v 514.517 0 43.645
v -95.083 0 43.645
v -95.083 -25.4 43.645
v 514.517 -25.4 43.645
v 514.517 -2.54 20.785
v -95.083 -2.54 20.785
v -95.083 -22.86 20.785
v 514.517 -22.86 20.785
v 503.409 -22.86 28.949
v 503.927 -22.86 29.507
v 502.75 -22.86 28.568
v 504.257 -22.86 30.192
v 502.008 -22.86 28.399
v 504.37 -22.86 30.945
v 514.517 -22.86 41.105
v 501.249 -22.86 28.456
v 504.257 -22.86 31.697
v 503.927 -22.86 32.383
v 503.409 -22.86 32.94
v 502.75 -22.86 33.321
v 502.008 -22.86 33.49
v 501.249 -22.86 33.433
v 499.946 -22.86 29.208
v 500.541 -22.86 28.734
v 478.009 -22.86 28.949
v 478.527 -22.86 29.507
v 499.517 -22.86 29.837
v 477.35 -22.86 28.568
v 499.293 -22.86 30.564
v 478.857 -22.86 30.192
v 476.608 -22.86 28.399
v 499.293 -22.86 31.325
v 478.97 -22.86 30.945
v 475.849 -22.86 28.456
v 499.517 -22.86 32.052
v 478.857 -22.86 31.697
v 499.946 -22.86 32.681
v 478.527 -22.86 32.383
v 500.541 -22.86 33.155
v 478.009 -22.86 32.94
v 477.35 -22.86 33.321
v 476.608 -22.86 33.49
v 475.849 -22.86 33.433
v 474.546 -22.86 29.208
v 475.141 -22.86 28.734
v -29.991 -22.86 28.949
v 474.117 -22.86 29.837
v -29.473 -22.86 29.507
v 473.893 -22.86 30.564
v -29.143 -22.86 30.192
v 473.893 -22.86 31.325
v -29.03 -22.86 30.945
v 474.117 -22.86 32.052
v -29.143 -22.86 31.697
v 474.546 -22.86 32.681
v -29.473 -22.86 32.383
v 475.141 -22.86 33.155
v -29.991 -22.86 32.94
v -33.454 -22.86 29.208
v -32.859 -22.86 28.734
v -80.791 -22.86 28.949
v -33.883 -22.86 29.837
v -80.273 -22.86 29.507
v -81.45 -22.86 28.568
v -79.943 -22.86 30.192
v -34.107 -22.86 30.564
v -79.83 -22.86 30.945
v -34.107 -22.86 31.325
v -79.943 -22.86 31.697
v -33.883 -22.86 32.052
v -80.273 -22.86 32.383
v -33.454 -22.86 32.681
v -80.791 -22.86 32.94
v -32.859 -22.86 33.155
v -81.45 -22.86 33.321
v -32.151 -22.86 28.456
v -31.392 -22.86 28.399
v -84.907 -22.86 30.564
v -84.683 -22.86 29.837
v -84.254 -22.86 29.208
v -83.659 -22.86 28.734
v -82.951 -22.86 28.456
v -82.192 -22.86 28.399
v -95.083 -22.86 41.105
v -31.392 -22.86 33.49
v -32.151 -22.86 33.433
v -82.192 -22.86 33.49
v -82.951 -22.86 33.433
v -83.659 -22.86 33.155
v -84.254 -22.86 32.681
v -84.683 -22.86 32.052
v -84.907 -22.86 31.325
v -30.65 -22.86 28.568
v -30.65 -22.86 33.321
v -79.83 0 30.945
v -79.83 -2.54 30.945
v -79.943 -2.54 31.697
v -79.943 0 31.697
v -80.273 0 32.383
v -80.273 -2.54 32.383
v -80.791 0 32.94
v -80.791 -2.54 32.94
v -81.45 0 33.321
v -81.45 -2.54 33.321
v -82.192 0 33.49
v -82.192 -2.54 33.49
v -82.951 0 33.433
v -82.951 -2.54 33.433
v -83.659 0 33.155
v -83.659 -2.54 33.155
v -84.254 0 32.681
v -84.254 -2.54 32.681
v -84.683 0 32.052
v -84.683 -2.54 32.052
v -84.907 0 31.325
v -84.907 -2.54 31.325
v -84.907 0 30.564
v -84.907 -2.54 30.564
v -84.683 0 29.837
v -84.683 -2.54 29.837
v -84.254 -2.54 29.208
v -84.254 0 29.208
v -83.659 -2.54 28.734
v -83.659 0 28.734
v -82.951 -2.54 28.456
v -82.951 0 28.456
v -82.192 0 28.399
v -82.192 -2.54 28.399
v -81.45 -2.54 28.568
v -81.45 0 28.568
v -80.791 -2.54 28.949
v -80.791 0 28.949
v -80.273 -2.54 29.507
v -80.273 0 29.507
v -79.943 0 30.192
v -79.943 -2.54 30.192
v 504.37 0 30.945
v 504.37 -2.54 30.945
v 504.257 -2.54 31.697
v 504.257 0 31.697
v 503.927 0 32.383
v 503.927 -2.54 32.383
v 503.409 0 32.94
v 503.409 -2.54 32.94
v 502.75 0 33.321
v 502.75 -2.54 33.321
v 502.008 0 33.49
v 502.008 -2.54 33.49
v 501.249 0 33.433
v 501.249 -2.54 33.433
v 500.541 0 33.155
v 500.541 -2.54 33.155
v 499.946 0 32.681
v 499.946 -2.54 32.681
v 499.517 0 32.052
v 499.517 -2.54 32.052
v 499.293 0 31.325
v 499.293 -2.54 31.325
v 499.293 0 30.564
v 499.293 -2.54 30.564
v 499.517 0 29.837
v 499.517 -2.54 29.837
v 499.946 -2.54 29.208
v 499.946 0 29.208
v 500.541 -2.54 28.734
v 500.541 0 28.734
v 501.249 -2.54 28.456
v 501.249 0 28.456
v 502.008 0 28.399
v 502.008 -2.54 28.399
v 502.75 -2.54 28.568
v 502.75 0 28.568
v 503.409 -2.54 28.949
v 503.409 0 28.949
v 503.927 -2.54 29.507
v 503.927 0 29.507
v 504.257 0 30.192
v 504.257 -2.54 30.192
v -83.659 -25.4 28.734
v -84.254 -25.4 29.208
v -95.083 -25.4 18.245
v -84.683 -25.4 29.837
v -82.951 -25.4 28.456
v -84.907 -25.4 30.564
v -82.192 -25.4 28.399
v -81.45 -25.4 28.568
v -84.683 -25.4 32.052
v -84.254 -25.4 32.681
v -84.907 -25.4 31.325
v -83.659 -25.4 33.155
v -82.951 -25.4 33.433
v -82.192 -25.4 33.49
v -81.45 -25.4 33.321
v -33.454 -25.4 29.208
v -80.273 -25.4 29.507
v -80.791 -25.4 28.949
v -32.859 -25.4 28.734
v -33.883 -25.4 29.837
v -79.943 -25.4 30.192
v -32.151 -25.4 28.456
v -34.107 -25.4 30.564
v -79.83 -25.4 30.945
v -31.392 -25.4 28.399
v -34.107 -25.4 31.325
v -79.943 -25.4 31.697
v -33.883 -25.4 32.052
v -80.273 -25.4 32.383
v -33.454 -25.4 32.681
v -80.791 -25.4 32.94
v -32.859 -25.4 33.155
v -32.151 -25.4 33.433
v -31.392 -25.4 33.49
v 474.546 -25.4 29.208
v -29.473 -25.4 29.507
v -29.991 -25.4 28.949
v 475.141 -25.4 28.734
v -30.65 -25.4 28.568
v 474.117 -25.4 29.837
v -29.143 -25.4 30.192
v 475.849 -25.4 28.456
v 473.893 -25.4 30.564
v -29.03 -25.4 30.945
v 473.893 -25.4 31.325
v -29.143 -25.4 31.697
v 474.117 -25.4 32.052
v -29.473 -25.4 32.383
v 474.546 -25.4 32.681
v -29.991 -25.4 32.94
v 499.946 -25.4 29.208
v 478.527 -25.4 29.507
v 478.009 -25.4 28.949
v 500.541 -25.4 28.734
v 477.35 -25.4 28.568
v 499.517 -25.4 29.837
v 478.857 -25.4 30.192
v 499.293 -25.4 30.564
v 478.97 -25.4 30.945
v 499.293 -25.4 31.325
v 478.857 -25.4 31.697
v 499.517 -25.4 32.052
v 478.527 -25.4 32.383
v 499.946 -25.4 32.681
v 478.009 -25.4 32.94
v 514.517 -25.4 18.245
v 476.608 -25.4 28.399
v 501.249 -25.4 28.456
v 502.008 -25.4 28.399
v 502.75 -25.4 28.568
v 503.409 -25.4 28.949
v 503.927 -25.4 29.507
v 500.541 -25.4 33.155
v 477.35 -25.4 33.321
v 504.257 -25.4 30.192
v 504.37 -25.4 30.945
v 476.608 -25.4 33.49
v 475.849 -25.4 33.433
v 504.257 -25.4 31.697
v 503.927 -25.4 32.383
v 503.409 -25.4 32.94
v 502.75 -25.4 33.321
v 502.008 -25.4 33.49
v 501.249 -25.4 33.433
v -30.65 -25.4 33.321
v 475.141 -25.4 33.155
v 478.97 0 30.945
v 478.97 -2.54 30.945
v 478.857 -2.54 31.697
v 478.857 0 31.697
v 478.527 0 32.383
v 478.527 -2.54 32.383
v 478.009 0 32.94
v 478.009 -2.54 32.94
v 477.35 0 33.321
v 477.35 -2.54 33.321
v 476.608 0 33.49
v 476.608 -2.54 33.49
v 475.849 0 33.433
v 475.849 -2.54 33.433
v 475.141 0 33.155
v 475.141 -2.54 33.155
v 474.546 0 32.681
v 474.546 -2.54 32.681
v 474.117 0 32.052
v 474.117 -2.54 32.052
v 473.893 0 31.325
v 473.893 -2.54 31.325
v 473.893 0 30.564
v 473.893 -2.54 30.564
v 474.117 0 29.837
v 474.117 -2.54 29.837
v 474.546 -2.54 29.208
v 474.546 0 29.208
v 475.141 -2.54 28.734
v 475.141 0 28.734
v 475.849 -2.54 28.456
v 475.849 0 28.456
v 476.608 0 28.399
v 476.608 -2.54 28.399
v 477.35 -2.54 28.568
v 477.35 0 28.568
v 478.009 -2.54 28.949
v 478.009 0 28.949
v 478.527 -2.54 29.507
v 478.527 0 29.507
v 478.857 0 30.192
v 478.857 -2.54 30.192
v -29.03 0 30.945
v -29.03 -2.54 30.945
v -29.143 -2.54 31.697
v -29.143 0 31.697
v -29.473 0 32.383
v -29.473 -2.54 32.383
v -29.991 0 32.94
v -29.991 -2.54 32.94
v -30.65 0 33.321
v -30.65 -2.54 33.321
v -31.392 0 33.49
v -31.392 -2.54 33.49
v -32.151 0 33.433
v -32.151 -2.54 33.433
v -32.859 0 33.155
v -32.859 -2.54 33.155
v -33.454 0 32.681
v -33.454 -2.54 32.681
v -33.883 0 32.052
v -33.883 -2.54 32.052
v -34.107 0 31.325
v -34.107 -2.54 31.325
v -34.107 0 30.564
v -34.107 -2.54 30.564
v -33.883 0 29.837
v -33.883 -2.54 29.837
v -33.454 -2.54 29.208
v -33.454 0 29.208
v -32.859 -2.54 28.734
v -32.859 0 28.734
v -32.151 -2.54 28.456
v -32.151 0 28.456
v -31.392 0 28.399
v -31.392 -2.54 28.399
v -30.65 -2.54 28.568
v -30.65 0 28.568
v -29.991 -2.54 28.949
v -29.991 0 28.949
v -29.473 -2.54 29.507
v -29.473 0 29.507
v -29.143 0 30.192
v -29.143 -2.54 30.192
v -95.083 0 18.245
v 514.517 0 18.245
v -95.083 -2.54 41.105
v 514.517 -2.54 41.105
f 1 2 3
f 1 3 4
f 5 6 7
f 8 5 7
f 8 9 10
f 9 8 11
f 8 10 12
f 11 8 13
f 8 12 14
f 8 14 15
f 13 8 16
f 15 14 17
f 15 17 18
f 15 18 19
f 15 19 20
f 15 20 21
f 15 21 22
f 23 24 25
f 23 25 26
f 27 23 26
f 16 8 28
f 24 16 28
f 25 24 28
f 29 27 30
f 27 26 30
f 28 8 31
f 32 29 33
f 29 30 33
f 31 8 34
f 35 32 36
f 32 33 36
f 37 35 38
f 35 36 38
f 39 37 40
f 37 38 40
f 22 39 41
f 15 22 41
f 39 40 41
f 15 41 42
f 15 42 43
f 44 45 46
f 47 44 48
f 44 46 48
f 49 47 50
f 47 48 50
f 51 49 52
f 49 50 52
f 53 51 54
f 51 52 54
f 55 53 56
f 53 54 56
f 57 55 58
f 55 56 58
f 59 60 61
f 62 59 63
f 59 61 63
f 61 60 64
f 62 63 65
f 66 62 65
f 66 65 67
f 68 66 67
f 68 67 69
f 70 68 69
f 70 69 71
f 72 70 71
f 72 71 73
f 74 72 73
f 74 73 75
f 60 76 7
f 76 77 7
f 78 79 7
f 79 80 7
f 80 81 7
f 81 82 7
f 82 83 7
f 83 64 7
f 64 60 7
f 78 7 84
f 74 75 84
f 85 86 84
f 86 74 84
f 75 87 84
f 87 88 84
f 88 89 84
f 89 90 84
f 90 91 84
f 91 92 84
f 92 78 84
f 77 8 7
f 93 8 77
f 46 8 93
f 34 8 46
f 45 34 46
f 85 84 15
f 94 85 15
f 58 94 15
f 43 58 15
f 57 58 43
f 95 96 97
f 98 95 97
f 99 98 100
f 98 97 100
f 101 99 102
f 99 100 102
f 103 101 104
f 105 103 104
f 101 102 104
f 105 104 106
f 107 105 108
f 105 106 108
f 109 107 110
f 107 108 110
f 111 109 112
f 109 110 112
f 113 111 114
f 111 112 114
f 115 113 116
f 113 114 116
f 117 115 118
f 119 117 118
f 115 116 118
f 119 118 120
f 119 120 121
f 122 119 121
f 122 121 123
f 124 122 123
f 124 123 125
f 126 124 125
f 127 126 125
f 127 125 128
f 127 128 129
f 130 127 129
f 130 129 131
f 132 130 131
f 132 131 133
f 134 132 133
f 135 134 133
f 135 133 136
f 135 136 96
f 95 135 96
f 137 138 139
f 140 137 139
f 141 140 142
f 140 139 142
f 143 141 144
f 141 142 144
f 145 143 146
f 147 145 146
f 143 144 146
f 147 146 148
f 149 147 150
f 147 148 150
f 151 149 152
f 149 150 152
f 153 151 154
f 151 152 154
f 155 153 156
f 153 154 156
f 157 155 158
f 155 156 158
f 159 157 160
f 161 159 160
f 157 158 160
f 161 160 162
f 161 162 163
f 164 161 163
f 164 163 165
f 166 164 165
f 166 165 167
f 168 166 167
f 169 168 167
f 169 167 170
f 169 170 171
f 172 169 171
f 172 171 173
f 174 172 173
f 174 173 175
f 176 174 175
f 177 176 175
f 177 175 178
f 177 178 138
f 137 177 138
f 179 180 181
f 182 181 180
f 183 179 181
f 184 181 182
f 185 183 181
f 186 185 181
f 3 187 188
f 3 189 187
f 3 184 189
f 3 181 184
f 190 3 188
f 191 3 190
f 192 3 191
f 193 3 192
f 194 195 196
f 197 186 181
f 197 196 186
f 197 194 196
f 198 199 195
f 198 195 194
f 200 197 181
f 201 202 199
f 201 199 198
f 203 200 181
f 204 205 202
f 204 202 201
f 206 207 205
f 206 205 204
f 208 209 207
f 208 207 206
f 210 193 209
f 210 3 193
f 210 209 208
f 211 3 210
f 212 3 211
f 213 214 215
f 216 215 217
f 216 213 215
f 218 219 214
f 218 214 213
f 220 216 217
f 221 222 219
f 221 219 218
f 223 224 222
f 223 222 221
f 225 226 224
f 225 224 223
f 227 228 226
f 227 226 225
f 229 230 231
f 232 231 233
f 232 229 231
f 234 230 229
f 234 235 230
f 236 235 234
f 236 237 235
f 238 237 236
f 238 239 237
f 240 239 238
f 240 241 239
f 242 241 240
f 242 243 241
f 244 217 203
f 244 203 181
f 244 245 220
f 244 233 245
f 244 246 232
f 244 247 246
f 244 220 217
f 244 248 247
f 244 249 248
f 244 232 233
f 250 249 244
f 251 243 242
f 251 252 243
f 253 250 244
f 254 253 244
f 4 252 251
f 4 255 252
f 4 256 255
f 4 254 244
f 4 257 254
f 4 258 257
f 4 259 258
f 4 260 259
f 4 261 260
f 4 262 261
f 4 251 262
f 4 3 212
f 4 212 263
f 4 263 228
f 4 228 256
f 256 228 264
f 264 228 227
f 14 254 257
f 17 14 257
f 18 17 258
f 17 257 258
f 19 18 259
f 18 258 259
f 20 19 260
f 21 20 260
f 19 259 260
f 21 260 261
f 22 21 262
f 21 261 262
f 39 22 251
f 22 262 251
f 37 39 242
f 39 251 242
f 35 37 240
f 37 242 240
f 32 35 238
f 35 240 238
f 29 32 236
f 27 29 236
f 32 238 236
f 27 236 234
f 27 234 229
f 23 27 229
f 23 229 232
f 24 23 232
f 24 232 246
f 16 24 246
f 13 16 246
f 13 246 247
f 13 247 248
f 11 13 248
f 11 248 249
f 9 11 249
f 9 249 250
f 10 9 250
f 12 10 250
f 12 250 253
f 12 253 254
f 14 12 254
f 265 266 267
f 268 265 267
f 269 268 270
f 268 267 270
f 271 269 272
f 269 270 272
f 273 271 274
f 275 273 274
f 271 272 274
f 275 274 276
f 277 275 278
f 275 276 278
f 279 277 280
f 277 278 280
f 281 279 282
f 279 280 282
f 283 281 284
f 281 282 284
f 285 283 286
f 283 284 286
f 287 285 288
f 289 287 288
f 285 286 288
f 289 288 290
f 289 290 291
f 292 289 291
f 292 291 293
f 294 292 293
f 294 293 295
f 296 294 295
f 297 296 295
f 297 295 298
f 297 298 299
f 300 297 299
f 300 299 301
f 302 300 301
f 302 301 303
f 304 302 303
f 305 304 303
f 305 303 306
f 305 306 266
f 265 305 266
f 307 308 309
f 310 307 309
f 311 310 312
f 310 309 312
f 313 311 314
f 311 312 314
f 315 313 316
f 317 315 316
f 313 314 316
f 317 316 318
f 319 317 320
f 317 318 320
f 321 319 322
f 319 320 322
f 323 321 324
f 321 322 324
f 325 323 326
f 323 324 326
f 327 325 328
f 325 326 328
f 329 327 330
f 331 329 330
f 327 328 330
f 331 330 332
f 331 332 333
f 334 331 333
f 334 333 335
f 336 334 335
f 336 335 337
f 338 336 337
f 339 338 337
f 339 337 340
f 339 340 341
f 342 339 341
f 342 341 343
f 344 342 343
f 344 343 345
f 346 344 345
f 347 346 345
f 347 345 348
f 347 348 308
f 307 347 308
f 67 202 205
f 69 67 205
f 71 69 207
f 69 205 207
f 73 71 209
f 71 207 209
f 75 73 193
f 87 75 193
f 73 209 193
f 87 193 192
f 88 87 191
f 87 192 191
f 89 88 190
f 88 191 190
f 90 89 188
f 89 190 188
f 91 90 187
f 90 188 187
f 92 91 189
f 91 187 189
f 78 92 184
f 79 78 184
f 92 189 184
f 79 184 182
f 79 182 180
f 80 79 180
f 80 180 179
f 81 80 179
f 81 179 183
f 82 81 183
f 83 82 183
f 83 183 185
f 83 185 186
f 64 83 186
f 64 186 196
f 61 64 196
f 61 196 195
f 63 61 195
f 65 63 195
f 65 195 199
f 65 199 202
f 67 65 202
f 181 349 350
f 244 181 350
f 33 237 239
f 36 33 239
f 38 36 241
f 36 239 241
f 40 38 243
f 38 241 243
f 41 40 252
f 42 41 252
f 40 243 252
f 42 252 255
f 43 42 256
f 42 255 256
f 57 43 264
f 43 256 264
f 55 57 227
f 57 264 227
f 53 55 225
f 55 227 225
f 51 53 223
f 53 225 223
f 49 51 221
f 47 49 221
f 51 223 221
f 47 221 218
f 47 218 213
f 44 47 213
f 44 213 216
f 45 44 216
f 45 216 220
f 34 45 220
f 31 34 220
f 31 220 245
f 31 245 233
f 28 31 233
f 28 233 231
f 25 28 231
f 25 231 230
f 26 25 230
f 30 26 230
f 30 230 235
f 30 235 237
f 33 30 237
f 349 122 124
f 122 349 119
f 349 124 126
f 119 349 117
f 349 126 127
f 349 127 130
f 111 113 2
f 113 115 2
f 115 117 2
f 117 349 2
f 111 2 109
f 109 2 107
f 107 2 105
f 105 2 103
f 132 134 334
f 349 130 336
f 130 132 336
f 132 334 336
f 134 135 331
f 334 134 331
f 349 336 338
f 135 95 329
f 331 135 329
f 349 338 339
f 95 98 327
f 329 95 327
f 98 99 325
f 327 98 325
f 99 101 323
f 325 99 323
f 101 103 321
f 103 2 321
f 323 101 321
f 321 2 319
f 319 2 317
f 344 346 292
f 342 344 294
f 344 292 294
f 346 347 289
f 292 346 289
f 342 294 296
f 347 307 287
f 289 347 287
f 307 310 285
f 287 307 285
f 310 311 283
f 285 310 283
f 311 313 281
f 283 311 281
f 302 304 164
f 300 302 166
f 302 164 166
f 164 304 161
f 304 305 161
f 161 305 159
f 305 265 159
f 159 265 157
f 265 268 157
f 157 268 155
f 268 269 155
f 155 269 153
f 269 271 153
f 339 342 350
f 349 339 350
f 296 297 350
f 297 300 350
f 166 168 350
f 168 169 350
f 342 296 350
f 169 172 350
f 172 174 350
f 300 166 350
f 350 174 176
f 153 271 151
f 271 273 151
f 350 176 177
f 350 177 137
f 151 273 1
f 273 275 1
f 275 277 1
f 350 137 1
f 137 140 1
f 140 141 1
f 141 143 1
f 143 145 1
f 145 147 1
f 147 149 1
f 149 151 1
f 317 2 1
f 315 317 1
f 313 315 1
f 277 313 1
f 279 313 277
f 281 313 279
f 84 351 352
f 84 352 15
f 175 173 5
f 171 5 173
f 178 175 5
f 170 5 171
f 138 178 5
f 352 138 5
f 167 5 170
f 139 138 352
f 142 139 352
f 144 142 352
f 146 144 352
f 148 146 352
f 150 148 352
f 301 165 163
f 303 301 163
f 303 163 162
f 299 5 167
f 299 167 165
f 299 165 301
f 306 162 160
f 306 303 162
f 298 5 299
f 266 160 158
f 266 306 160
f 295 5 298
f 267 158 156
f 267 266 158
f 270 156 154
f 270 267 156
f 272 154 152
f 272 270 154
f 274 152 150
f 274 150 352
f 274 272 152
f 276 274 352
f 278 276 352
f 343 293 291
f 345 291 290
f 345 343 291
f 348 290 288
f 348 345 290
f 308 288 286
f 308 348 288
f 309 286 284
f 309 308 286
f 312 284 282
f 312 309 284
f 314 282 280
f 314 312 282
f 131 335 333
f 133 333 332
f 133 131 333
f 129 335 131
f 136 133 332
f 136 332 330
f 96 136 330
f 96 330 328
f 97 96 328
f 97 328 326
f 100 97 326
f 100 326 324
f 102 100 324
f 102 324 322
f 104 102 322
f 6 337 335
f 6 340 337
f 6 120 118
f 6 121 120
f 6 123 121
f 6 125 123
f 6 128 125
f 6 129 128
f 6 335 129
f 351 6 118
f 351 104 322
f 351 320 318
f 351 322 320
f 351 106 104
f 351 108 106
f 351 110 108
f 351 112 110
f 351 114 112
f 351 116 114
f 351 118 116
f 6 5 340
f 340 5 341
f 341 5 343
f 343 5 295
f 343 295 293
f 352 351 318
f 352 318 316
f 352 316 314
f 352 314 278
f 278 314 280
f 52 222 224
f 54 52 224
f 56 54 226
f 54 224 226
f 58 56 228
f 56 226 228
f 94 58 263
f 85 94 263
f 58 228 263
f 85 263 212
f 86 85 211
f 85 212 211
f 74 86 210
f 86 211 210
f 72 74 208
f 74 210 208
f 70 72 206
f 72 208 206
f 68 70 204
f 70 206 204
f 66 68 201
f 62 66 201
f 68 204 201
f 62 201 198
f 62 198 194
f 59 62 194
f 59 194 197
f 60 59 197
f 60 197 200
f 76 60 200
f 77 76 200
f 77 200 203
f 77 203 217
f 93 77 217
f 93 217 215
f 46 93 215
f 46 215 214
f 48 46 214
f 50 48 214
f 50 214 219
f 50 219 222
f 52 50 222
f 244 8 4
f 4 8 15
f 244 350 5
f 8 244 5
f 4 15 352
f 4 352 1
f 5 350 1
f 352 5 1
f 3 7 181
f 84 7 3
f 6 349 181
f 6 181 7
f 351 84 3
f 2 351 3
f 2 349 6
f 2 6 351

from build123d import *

# Parameters (mm, degrees)
F0_W     = 609.6
F0_H     = 25.4
F1_DEPTH = 25.4
F2_W     = 20.32
F2_H     = 20.32
F3_DEPTH = 609.6
F4_R     = 2.5527
F5_DEPTH = 25.4


with BuildPart() as f1:
    # F0 (on Front) → F1 (new body)
    with BuildSketch(Plane.XZ):
        with Locations((209.717386, 30.944633)):
            Rectangle(F0_W, F0_H)
    extrude(amount=F1_DEPTH)

    # F2 (on face) → F3 (cut)
    with BuildSketch(Plane(origin=(-95.082614, 0, 0), x_dir=(0, -1, 0), z_dir=(-1, 0, 0))):
        with Locations((12.7, 30.944633)):
            Rectangle(F2_W, F2_H)
    extrude(amount=-F3_DEPTH, mode=Mode.SUBTRACT)

    # F4 (on face) → F5 (cut)
    with BuildSketch(Plane.XZ.offset(25.4)):
        with Locations((501.817386, 30.944633)):
            Circle(F4_R)
        with Locations((476.417386, 30.944633)):
            Circle(F4_R)
        with Locations((-82.382614, 30.944633)):
            Circle(F4_R)
        with Locations((-31.582614, 30.944633)):
            Circle(F4_R)
    extrude(amount=-F5_DEPTH, mode=Mode.SUBTRACT)


solid = f1.part
